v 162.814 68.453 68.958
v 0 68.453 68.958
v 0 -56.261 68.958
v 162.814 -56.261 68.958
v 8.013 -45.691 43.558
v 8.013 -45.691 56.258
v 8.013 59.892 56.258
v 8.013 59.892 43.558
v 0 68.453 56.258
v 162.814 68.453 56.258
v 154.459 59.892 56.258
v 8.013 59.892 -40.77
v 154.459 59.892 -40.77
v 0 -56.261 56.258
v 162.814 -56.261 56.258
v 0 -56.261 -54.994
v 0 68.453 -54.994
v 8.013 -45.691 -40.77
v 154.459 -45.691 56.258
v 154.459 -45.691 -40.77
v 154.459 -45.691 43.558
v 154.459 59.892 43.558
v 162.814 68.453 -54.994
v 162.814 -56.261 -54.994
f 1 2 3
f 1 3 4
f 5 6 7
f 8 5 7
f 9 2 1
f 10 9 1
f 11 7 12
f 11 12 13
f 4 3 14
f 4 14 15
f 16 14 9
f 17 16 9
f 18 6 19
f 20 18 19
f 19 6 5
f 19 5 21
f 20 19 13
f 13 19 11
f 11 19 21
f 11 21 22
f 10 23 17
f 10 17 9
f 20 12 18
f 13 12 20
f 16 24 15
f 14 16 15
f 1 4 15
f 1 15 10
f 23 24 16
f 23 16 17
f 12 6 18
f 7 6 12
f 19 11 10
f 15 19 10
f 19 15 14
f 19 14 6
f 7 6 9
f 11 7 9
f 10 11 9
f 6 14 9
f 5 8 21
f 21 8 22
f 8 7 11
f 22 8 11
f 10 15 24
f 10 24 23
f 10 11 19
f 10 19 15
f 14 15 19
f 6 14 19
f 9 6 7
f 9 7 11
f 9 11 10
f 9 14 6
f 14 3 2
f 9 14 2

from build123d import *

# Parameters (mm, degrees)
F0_W     = 124.713998
F0_H     = 111.252006
F1_DEPTH = 162.814
F2_W     = 146.446304
F2_H     = 105.582983
F3_DEPTH = 97.028
F5_W     = 162.814
F5_H     = 124.713998
F6_DEPTH = 12.7


with BuildPart() as f1:
    # F0 (on Right) → F1 (new body)
    with BuildSketch(Plane.YZ):
        with Locations((6.096, 0.632355)):
            Rectangle(F0_W, F0_H)
    extrude(amount=F1_DEPTH)

    # F2 (on face) → F3 (cut)
    with BuildSketch(Plane.XY.offset(56.258358)):
        with Locations((81.236056, 7.100009)):
            Rectangle(F2_W, F2_H)
    extrude(amount=-F3_DEPTH, mode=Mode.SUBTRACT)


with BuildPart() as f6:
    # F5 (on face) → F6 (new body, symmetric)
    with BuildSketch(Plane.XY.offset(56.258358)):
        with Locations((81.407, 6.096)):
            Rectangle(F5_W, F5_H)
    extrude(amount=F6_DEPTH, both=True)

    # F7: cut F1
    add(f1.part, mode=Mode.SUBTRACT)


solid = Compound([f1.part, f6.part])
